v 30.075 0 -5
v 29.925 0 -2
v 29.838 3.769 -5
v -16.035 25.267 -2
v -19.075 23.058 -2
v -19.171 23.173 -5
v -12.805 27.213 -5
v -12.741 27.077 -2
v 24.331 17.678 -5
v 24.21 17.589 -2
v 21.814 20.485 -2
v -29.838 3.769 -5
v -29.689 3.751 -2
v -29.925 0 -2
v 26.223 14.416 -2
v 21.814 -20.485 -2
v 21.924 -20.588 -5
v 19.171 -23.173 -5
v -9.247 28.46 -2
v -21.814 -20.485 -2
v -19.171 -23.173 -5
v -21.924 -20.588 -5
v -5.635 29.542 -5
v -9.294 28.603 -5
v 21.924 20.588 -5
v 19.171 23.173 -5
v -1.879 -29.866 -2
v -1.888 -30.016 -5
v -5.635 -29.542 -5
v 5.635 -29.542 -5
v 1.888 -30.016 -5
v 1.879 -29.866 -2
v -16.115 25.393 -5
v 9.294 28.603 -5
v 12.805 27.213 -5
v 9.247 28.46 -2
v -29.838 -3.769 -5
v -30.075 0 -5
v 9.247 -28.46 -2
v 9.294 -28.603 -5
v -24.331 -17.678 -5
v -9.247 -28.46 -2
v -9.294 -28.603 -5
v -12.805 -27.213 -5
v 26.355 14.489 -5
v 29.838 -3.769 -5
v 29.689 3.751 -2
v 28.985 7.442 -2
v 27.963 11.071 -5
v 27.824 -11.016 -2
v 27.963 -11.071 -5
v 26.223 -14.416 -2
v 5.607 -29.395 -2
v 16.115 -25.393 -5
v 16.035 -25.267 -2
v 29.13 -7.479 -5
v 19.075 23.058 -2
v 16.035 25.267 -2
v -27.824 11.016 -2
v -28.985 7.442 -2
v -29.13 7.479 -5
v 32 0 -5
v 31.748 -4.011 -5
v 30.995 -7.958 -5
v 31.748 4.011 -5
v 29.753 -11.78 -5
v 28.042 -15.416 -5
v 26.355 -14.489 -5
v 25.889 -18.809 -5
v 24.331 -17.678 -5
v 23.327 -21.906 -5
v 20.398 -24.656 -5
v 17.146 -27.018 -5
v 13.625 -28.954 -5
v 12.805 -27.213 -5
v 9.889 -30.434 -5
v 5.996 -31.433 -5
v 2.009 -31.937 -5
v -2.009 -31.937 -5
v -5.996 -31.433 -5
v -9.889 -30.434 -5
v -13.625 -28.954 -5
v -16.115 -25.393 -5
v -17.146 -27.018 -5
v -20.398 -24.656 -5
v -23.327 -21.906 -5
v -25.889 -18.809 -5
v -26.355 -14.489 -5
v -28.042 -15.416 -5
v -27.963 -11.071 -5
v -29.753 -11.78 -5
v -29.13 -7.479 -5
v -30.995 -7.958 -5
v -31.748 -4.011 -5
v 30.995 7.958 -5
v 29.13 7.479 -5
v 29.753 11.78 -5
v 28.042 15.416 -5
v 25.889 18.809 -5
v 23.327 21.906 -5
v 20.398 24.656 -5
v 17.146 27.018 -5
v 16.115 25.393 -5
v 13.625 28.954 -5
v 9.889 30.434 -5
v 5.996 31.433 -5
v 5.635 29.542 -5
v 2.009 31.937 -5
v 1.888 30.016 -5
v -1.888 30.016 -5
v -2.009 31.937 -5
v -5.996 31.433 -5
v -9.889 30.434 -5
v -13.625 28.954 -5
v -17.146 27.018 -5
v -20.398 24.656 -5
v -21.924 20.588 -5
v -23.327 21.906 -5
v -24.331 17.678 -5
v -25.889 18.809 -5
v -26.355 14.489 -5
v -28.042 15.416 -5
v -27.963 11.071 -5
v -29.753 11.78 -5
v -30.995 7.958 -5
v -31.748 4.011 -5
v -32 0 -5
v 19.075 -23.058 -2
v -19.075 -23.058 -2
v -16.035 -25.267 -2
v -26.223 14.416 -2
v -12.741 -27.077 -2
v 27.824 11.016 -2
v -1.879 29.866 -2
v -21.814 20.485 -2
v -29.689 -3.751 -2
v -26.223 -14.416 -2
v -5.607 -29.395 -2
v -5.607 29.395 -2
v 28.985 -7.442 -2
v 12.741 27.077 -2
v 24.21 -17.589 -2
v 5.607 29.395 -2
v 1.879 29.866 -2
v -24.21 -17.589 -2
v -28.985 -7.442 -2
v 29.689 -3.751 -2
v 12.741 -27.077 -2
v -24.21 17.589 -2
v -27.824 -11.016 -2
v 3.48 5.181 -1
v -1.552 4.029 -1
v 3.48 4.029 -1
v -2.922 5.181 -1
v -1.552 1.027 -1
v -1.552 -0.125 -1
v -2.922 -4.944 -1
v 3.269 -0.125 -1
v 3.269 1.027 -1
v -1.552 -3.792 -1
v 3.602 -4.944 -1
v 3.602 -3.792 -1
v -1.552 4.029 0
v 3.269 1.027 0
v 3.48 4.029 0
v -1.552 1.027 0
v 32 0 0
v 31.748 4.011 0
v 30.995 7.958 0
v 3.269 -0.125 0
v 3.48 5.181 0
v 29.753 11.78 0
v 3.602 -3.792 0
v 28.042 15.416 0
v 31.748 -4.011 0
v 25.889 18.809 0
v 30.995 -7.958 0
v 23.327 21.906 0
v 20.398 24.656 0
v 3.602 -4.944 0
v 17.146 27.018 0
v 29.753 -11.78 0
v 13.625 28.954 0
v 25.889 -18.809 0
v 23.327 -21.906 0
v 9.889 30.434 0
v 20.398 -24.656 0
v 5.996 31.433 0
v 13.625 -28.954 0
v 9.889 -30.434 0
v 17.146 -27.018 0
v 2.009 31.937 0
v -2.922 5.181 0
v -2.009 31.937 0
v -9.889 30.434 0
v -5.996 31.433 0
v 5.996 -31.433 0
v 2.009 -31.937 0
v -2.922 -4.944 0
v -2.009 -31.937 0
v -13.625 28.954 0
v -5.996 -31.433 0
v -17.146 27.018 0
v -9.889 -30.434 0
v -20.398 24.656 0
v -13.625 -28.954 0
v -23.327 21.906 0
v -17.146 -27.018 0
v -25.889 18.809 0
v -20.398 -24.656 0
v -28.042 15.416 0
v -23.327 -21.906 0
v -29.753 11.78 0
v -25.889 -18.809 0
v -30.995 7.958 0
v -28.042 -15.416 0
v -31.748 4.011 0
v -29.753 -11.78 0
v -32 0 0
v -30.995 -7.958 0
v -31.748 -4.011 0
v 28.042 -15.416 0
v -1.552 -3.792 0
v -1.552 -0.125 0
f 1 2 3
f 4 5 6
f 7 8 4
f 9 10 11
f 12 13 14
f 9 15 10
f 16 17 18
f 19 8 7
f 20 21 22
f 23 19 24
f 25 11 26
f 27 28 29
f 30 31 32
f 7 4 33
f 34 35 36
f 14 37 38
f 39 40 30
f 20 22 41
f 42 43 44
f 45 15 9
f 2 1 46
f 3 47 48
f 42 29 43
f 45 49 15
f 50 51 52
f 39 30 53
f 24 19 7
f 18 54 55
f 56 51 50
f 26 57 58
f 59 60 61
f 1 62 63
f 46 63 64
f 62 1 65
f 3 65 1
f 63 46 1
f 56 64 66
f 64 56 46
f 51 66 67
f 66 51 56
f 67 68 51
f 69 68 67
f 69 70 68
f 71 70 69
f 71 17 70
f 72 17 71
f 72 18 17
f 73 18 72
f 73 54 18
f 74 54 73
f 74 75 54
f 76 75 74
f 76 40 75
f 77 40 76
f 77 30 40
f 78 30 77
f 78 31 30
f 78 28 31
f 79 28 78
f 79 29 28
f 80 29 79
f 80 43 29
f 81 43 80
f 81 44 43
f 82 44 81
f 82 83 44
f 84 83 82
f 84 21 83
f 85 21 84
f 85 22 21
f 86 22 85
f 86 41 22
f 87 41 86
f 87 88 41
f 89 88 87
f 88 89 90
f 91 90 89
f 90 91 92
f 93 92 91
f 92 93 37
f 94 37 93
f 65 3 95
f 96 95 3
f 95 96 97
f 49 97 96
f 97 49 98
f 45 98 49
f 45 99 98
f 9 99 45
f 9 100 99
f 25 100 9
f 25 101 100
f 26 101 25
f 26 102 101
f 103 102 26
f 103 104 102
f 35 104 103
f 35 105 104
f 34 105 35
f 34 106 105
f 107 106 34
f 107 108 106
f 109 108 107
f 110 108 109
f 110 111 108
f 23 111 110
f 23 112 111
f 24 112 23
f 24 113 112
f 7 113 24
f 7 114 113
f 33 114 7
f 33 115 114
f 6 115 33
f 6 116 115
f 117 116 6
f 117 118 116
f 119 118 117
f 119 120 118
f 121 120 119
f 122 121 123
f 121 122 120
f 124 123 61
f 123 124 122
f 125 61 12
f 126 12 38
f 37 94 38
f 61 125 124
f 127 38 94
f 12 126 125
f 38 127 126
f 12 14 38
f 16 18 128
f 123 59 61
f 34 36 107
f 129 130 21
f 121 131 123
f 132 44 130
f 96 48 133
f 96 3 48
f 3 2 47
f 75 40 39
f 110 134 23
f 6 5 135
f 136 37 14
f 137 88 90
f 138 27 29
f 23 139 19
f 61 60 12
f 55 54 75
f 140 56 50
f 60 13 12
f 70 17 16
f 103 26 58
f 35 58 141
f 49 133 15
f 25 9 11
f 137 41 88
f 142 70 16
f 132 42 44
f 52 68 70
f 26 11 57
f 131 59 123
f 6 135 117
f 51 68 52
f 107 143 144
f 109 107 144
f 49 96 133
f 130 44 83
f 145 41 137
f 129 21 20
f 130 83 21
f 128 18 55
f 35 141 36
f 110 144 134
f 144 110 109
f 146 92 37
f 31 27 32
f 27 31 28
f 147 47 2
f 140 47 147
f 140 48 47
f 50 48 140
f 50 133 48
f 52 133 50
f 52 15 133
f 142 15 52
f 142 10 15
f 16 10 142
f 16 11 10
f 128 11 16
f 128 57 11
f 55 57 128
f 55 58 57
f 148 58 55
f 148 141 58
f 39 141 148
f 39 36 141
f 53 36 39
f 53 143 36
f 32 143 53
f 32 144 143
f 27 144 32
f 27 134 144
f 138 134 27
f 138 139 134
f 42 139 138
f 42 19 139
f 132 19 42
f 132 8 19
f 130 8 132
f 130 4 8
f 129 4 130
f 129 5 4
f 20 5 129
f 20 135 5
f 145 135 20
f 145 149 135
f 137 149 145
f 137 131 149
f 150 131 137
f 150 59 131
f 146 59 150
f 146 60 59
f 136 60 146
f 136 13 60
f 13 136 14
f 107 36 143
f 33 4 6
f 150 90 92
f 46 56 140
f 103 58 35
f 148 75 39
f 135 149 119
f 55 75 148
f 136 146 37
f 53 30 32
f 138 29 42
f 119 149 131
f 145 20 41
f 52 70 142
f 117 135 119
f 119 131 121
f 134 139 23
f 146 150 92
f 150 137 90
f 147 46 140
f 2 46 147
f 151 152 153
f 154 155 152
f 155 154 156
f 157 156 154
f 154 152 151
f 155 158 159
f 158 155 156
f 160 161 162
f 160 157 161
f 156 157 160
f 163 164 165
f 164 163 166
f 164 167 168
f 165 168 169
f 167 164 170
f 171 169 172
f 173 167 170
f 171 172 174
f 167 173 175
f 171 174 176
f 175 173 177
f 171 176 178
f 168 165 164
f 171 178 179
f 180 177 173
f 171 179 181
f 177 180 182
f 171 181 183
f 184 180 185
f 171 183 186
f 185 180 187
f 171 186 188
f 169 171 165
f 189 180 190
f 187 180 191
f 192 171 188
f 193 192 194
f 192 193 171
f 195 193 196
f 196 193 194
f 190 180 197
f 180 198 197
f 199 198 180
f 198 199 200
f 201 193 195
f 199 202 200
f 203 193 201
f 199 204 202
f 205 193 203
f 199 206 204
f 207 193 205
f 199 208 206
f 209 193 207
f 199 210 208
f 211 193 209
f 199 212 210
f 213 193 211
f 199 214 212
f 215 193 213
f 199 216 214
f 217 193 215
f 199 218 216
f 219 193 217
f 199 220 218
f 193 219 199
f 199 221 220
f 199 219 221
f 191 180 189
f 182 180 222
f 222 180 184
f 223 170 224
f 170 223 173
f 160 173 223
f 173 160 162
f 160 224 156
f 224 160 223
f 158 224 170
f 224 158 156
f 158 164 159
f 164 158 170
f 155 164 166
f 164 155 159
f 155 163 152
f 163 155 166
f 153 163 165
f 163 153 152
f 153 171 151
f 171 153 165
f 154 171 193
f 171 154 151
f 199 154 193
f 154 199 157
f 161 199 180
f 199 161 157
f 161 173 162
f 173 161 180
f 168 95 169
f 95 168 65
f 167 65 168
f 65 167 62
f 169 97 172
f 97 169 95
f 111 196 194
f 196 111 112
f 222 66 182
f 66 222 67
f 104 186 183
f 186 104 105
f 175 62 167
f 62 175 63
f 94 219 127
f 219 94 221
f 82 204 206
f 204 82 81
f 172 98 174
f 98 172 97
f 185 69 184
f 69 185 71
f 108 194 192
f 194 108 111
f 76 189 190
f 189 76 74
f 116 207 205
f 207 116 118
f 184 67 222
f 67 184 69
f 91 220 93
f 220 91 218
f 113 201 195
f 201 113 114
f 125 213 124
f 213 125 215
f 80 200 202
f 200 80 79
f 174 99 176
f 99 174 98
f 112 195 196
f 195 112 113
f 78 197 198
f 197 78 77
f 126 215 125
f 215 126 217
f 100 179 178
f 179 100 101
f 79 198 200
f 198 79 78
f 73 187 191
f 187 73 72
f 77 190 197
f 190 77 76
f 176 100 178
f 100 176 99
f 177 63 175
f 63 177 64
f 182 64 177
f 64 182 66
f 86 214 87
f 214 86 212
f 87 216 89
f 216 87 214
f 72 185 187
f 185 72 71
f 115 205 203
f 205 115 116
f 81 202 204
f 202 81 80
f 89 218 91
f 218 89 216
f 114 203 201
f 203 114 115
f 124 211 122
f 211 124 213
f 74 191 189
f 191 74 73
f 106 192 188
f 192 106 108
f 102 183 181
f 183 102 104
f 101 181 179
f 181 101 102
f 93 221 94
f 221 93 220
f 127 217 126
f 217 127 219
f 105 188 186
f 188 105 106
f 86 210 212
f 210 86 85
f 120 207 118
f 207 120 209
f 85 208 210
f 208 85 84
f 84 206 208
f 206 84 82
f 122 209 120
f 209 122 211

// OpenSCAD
$fn = 50;

difference() {
	union() {
		translate(v = [0, 0, -5.0]) {
			cylinder(h = 5, r = 32.0);
		}
	}
	union() {
		#translate(v = [0, 0, -5.0]) {
			cylinder(h = 3, r1 = 30.075, r2 = 29.925);
		}
		translate(v = [0, 0, -1]) {
			linear_extrude(height = 1) {
				text(font = "Impact", halign = "center", size = 10, text = "E", valign = "center");
			}
		}
	}
}
